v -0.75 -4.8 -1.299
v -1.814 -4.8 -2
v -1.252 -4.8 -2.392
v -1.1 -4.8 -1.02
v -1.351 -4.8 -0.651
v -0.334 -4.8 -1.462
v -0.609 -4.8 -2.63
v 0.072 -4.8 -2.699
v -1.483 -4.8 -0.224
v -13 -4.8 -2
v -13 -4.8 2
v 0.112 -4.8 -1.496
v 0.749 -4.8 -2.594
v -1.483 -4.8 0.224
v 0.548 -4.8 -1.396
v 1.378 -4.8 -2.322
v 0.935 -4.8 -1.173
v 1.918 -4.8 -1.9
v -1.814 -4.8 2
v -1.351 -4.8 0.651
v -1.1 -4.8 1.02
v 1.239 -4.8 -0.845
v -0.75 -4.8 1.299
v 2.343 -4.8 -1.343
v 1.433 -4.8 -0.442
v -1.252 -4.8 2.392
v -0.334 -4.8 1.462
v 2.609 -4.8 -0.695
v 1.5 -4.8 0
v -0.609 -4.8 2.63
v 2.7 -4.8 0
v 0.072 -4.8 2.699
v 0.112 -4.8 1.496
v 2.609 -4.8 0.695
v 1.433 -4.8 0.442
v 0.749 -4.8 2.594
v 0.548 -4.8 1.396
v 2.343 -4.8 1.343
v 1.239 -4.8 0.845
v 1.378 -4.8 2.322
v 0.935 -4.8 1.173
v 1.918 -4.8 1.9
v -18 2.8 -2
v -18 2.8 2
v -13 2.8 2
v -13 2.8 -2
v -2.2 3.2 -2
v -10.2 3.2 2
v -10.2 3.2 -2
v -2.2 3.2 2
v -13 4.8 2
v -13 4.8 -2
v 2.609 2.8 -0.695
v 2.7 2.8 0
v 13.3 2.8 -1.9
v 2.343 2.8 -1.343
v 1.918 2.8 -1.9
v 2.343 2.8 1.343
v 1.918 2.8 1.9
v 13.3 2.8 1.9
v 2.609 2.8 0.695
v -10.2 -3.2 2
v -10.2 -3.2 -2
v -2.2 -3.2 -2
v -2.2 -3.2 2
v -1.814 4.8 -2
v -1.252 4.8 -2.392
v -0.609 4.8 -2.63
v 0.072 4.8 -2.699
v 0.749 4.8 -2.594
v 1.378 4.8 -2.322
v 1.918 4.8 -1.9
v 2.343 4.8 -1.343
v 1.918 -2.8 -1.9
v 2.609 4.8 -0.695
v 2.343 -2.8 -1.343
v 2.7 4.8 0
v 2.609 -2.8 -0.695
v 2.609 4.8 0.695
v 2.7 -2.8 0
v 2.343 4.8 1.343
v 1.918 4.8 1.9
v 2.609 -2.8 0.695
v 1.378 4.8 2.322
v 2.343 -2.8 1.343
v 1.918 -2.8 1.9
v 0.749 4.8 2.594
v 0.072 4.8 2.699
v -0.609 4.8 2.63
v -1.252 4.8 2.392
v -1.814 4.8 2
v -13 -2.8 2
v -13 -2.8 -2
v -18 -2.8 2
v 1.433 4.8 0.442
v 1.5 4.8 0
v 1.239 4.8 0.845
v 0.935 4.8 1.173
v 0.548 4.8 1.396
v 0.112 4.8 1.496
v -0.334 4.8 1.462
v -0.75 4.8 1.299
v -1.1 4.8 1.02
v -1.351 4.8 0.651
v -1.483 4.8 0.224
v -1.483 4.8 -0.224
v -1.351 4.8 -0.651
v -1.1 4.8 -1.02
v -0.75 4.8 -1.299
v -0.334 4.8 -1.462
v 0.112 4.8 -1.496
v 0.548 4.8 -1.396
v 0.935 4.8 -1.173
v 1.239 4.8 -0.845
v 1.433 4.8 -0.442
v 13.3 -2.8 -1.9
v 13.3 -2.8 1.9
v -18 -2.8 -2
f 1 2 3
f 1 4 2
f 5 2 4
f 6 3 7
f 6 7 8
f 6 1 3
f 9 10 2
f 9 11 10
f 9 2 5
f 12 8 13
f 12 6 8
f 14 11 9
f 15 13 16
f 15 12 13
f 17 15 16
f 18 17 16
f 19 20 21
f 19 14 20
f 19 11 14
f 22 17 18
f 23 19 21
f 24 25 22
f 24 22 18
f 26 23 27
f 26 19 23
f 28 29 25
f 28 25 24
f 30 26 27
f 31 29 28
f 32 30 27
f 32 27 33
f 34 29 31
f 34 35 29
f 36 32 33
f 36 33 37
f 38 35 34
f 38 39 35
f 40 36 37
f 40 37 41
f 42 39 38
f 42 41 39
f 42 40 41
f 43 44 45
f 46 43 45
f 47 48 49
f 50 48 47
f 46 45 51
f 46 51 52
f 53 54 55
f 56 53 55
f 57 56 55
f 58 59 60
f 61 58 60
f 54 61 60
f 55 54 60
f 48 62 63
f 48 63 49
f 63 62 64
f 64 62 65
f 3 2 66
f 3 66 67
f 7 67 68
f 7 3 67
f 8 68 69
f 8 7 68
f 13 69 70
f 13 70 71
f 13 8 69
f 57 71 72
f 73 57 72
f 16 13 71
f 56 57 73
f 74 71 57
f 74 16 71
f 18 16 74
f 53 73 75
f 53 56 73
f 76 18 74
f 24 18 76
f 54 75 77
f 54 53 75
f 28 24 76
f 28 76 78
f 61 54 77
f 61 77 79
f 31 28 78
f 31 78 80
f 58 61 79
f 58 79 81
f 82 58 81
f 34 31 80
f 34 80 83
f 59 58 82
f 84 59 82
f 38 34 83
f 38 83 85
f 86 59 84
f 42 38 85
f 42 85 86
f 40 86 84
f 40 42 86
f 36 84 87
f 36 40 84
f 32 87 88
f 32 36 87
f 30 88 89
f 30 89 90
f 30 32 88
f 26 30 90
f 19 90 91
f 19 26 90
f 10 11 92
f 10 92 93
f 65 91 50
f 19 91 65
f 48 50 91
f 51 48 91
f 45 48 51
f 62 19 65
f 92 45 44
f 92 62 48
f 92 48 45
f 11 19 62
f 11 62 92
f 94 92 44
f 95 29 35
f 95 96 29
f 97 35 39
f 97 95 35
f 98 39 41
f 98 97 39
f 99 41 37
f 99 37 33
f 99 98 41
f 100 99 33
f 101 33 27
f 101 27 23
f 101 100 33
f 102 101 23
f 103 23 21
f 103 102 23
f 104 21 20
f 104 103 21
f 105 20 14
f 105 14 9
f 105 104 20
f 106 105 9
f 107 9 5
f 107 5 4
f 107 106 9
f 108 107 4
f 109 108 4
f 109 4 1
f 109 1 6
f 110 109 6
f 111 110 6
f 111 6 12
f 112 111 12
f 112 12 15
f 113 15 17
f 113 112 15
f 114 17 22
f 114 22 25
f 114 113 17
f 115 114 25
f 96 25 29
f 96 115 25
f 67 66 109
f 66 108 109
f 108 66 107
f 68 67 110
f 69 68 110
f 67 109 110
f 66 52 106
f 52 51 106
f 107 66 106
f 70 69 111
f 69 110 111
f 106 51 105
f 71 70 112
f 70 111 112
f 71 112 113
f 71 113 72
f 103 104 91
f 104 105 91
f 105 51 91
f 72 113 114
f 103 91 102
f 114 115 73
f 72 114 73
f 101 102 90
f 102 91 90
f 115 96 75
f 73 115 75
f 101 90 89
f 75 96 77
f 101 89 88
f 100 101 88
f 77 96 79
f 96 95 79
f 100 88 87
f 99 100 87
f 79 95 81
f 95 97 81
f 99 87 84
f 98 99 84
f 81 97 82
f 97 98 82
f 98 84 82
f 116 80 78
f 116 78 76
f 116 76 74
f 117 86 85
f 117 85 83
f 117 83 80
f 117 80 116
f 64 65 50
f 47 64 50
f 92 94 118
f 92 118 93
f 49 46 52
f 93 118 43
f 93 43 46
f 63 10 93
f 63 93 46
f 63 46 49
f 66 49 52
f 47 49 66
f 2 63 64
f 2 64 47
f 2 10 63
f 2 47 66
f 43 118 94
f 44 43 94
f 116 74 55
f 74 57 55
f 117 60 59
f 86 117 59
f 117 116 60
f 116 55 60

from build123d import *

# Parameters (mm, degrees)
F0_R     = 1.5
F1_DEPTH = 4.8
F0_W     = 5
F0_H     = 4
F2_DEPTH = 2.8
F3_W     = 8
F3_H     = 6.4
F4_DEPTH = 4.701


with BuildPart() as f1:
    # F0 (on Front) → F1 (new body, symmetric)
    with BuildSketch(Plane.XZ):
        with BuildLine():
            Line((-13, -2), (-1.8138357147, -2))
            ThreePointArc((-1.8138357147, -2), (0.0723180492, -2.6990313262), (1.9183326093, -1.9))
            ThreePointArc((1.9183326093, -1.9), (2.7, 0), (1.9183326093, 1.9))
            ThreePointArc((1.9183326093, 1.9), (0.0723180492, 2.6990313262), (-1.8138357147, 2))
            Line((-1.8138357147, 2), (-13, 2))
            Line((-13, 2), (-13, -2))
        make_face()
        Circle(F0_R, mode=Mode.SUBTRACT)
    extrude(amount=F1_DEPTH, both=True)

    # F0 (on Front) → F2 (join, symmetric)
    with BuildSketch(Plane.XZ):
        with BuildLine():
            ThreePointArc((1.9183326093, 1.9), (2.7, 0), (1.9183326093, -1.9))
            Line((1.9183326093, -1.9), (13.3, -1.9))
            Line((13.3, -1.9), (13.3, 1.9))
            Line((13.3, 1.9), (1.9183326093, 1.9))
        make_face()
        with Locations((-15.5, 0)):
            Rectangle(F0_W, F0_H)
    extrude(amount=F2_DEPTH, both=True)

    # F3 (on face) → F4 (cut, through all)
    with BuildSketch(Plane.XY.offset(2)):
        with Locations((-6.2, 0)):
            Rectangle(F3_W, F3_H)
    extrude(amount=-F4_DEPTH, mode=Mode.SUBTRACT)


solid = f1.part
